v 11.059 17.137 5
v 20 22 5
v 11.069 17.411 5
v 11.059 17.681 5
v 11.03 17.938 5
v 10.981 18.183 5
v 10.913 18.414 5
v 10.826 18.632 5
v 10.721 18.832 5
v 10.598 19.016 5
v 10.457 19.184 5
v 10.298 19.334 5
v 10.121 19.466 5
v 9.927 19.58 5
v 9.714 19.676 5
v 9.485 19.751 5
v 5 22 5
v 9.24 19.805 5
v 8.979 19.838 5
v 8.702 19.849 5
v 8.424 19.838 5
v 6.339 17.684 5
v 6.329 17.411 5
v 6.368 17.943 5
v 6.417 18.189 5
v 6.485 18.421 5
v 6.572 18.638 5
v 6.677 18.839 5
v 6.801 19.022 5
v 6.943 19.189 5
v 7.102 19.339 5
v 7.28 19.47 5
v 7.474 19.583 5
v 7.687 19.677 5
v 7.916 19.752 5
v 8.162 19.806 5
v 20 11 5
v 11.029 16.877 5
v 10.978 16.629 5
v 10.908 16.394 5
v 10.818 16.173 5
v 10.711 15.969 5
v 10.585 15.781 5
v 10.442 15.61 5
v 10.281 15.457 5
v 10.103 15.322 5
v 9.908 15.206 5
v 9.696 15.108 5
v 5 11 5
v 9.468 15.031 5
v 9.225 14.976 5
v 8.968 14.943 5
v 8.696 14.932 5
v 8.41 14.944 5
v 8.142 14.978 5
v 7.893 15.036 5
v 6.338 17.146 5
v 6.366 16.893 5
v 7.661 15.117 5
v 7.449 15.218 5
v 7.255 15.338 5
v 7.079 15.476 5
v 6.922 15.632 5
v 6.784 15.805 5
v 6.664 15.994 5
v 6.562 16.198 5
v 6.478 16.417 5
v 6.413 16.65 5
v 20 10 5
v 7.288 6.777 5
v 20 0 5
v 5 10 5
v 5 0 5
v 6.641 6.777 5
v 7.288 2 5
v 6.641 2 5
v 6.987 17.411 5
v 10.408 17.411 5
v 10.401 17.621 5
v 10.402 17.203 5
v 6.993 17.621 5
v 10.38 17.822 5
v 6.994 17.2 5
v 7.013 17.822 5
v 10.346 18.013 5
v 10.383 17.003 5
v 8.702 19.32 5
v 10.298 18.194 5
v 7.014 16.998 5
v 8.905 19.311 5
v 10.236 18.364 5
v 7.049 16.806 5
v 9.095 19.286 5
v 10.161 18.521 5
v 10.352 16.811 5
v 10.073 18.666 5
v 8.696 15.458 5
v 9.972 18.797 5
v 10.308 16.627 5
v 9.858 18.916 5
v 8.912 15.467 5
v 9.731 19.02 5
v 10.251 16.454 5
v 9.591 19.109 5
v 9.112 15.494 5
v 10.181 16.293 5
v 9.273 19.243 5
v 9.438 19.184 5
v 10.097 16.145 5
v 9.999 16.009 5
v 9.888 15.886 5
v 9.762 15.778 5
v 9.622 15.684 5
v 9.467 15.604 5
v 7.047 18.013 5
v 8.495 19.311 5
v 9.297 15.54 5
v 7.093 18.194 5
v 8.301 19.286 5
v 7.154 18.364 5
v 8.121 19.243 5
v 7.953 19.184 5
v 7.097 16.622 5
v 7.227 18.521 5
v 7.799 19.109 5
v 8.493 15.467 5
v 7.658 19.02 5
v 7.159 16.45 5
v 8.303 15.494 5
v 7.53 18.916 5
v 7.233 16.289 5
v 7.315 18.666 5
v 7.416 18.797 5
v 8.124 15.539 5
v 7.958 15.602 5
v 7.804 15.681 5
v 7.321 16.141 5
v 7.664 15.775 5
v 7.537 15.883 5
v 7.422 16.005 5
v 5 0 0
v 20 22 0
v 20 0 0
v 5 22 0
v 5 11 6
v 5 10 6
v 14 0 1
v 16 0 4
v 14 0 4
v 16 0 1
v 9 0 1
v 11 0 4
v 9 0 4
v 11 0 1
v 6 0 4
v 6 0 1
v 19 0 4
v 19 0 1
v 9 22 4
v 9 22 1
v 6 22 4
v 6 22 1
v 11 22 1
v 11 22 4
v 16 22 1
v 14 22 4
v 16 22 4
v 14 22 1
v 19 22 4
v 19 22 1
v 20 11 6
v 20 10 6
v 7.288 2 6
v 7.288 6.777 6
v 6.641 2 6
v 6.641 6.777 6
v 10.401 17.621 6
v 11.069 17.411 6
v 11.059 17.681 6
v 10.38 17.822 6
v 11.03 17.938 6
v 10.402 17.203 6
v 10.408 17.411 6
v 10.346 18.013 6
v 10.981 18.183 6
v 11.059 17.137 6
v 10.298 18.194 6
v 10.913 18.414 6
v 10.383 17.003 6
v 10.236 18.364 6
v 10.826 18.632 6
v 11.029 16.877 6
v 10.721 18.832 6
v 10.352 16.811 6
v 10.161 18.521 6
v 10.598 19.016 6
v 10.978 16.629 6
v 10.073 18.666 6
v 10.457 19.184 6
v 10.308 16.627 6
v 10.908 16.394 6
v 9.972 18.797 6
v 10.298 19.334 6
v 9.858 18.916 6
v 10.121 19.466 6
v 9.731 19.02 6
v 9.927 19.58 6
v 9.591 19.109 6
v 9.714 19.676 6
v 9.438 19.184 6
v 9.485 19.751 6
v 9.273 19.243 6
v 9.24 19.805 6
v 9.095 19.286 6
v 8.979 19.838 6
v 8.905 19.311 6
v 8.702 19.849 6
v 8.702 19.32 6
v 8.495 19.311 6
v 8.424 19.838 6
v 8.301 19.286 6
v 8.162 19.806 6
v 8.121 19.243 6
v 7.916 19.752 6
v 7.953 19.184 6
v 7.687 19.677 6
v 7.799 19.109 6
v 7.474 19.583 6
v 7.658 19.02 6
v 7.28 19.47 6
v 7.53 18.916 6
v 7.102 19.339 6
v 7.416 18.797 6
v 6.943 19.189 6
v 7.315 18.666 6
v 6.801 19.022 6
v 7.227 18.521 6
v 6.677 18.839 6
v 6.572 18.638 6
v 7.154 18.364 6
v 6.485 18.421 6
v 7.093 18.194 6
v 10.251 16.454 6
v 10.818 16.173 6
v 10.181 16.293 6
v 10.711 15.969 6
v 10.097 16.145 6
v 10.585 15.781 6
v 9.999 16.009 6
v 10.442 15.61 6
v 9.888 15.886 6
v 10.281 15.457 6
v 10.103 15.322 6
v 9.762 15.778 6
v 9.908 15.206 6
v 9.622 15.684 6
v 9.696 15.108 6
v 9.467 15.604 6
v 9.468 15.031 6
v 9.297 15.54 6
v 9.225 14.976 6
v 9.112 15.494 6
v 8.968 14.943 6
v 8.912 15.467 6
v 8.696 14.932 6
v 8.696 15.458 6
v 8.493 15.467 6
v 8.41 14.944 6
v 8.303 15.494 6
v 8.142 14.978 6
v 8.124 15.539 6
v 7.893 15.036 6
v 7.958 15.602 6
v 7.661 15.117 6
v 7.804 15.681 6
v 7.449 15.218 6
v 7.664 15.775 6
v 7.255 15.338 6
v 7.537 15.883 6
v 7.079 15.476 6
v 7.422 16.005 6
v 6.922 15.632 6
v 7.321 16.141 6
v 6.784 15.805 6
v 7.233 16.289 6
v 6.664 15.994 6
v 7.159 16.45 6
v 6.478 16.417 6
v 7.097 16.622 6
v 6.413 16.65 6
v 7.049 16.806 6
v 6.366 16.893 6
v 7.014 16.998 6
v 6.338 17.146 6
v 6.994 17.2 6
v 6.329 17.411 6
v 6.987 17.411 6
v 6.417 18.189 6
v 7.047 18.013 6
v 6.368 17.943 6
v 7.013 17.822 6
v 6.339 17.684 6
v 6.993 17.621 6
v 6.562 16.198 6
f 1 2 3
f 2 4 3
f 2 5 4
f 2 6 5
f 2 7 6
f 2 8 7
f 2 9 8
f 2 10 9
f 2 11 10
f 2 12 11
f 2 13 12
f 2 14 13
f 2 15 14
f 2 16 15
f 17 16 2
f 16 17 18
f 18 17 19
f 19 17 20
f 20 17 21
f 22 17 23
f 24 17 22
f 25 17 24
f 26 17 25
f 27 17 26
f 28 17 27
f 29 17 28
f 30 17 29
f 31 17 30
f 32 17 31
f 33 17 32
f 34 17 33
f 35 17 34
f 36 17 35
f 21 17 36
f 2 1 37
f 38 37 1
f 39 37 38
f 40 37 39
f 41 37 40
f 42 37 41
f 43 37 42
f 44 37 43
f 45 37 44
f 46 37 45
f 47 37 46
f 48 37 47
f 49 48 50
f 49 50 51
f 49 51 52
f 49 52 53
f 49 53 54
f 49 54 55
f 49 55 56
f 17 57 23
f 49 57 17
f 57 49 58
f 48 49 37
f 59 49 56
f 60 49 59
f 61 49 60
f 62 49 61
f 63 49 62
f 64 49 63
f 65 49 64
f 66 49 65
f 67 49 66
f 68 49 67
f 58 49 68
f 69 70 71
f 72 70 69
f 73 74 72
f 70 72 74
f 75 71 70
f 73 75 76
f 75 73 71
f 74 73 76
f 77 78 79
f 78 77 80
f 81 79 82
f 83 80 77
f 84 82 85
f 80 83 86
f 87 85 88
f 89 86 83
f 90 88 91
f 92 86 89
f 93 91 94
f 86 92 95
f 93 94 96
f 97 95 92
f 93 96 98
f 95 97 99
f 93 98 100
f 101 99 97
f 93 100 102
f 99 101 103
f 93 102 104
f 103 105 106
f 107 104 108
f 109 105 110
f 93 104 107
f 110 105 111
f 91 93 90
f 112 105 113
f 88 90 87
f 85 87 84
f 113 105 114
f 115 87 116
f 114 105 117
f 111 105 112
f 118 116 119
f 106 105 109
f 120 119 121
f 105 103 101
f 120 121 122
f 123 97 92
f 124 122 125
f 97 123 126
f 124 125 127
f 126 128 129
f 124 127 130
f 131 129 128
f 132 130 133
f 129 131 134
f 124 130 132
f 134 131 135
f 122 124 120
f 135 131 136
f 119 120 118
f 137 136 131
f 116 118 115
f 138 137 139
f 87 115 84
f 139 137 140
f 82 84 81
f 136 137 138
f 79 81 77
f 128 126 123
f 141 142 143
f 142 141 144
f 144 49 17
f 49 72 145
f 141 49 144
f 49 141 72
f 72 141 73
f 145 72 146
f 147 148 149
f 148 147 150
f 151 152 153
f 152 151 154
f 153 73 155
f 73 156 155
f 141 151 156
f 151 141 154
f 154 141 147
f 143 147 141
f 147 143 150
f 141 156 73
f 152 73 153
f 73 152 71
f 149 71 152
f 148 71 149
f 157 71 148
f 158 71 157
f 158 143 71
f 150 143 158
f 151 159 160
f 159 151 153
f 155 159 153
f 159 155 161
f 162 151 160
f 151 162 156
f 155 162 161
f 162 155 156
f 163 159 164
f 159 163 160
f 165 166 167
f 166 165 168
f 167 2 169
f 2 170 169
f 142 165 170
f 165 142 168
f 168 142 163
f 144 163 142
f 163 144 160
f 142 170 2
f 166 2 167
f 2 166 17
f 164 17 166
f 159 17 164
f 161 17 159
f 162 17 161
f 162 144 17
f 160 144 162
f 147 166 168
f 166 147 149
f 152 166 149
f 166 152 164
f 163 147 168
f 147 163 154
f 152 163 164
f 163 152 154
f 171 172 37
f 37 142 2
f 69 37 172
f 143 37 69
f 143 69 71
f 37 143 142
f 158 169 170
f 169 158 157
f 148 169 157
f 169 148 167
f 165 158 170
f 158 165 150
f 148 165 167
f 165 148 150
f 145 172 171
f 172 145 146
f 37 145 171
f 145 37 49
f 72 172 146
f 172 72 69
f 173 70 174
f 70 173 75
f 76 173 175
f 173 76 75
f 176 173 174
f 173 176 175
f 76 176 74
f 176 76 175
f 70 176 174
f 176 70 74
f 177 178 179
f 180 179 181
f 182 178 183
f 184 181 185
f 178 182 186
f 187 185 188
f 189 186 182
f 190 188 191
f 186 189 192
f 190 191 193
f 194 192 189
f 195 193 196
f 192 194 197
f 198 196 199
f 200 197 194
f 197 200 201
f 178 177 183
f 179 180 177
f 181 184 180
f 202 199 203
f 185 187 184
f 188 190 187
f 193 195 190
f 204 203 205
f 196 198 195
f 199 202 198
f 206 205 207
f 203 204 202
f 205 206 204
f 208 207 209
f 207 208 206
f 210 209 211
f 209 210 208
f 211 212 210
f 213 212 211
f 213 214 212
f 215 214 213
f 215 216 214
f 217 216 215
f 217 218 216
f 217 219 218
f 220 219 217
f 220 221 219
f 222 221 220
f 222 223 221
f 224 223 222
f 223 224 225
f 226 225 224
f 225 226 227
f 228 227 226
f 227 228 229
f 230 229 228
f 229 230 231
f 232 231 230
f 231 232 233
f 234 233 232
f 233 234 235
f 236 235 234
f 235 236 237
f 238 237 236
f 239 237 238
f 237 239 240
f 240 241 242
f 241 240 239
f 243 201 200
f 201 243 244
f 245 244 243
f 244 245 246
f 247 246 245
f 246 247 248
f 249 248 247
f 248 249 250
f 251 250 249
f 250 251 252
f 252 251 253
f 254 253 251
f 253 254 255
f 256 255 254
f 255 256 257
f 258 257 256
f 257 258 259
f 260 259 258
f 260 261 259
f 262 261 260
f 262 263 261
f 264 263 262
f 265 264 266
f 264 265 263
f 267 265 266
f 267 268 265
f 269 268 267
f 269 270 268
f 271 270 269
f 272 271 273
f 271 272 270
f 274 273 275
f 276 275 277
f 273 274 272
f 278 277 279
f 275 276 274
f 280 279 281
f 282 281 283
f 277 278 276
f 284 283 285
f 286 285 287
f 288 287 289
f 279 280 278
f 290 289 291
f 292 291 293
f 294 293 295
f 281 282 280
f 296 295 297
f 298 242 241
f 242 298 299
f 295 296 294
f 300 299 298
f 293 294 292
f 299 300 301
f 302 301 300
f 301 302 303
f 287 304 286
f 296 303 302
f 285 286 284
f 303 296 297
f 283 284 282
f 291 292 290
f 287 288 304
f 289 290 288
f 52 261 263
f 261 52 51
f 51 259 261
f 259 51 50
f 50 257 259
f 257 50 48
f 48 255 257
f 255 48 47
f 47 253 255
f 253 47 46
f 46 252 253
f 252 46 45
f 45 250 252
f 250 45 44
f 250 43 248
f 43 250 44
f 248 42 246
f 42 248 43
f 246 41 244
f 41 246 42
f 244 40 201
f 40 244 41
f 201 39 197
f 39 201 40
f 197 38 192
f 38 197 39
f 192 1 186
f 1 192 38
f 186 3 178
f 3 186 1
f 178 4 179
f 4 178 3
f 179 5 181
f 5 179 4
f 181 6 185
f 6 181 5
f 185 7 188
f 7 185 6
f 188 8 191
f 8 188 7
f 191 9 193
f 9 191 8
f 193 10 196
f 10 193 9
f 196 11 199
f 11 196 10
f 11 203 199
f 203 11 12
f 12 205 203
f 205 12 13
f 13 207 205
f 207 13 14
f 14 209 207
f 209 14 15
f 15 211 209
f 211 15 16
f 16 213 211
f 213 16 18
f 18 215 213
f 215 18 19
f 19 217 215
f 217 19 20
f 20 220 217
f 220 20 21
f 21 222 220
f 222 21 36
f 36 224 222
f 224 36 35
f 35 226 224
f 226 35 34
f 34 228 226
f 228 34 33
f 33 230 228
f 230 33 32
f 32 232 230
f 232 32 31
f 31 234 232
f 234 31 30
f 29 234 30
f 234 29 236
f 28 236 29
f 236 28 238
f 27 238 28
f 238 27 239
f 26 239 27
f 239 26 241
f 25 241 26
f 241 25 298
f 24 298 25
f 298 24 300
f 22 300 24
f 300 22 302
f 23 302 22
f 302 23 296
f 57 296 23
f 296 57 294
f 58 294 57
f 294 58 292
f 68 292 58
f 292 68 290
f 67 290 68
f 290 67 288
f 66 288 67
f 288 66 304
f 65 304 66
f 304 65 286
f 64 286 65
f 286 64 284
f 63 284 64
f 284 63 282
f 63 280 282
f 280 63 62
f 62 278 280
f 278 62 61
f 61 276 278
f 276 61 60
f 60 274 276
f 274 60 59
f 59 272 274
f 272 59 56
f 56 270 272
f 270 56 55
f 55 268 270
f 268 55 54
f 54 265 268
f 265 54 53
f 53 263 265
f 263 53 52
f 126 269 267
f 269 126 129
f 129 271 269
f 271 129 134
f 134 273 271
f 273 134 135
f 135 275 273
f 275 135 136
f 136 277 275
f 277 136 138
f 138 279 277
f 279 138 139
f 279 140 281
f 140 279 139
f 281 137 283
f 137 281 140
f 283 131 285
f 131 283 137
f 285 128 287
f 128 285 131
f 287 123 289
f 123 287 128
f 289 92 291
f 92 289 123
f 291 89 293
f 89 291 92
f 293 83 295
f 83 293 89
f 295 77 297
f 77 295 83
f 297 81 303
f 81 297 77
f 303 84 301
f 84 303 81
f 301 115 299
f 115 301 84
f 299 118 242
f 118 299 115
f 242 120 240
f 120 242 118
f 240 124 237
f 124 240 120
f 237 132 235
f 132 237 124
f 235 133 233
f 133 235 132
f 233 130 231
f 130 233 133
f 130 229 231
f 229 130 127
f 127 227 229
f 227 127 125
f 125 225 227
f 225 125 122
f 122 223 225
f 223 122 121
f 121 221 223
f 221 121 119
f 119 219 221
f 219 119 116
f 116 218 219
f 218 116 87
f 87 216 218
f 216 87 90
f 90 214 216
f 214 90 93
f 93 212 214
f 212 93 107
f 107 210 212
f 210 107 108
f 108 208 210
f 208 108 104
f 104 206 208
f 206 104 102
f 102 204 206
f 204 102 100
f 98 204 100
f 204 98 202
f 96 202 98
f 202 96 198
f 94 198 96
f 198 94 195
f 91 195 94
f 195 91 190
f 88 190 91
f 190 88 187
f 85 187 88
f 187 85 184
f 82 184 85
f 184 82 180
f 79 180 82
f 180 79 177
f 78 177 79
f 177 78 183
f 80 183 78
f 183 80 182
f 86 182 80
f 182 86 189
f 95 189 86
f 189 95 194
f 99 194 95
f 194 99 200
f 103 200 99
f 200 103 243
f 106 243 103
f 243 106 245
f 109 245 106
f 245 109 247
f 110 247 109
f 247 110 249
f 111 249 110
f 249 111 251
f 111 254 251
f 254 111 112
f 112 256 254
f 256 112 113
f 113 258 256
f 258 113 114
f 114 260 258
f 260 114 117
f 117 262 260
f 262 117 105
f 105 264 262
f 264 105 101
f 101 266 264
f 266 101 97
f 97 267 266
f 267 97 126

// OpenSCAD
//somehow this affects the cylinders and text so they are smoother
$fn=25;
// dupont connector outer size
width = 3;
depth = 3;
lenght = 11;//the connectors should fit perfectly snug in the case, but 2mm should stick out so that they can be pulled out
border = 2;//if the holder isn't strong, it tends to break down when you stick a dupont in it
// outer size, just for convenience
dupontWidth = width+border;
dupontLenght = lenght+border;
dupontHeight = depth+border;
//these are individual so that I can make changes to one side or the other
module dupont () {
    // dupont holder x1, difference uses the first param as a solid, and then removes the rest of the params from it
    difference() {
        // outside of the connector's single holder
        cube([dupontWidth, lenght, dupontHeight]);
        // inside of the dupont connector single holder
        translate ([border*0.5, 0, border*0.5]) cube([width, lenght, depth]);
    }
}
/**
* Parametrizable maker of tiny dupont group holders
**/
module makeHolder (total=3) {
    // divider line for the two sides of the connector
    translate([dupontWidth*(1), lenght-(border/2), depth+border ]) color ("red") cube([dupontWidth*total, border/2, border/2]); 
    // obviously we gotta label the sides, it's nice to have labels (?
    translate([dupontWidth+1, border, dupontHeight ]) linear_extrude(1) text("I", 5);
    translate([dupontWidth+1, (lenght*2)-5-border, dupontHeight ]) linear_extrude(1) text("O", 5);
    /**
     we are creating 3 holders, since that's what I usually need for keyboards
     but it's easy to just change this to be 5, 10, whatever size holder we need
    **/
    for(dupontCount = [1 : total]) {
        xDistance = dupontWidth*dupontCount;
        translate([xDistance, 0,0]) color("red") dupont();
        // hacky "border/8"  is to avoid edges touching without overlapping AKA "not a manifold" error
        // IDK what a nice fix would be here, yet
        xRotated = -1*dupontWidth;
        rotate([0,0,180]) translate([xRotated*(dupontCount+1), -1*((lenght)*2),0]) color("yellow") dupont();
    }
}
// make 3 holders, just change 3 to whatever number we need
makeHolder(3);
